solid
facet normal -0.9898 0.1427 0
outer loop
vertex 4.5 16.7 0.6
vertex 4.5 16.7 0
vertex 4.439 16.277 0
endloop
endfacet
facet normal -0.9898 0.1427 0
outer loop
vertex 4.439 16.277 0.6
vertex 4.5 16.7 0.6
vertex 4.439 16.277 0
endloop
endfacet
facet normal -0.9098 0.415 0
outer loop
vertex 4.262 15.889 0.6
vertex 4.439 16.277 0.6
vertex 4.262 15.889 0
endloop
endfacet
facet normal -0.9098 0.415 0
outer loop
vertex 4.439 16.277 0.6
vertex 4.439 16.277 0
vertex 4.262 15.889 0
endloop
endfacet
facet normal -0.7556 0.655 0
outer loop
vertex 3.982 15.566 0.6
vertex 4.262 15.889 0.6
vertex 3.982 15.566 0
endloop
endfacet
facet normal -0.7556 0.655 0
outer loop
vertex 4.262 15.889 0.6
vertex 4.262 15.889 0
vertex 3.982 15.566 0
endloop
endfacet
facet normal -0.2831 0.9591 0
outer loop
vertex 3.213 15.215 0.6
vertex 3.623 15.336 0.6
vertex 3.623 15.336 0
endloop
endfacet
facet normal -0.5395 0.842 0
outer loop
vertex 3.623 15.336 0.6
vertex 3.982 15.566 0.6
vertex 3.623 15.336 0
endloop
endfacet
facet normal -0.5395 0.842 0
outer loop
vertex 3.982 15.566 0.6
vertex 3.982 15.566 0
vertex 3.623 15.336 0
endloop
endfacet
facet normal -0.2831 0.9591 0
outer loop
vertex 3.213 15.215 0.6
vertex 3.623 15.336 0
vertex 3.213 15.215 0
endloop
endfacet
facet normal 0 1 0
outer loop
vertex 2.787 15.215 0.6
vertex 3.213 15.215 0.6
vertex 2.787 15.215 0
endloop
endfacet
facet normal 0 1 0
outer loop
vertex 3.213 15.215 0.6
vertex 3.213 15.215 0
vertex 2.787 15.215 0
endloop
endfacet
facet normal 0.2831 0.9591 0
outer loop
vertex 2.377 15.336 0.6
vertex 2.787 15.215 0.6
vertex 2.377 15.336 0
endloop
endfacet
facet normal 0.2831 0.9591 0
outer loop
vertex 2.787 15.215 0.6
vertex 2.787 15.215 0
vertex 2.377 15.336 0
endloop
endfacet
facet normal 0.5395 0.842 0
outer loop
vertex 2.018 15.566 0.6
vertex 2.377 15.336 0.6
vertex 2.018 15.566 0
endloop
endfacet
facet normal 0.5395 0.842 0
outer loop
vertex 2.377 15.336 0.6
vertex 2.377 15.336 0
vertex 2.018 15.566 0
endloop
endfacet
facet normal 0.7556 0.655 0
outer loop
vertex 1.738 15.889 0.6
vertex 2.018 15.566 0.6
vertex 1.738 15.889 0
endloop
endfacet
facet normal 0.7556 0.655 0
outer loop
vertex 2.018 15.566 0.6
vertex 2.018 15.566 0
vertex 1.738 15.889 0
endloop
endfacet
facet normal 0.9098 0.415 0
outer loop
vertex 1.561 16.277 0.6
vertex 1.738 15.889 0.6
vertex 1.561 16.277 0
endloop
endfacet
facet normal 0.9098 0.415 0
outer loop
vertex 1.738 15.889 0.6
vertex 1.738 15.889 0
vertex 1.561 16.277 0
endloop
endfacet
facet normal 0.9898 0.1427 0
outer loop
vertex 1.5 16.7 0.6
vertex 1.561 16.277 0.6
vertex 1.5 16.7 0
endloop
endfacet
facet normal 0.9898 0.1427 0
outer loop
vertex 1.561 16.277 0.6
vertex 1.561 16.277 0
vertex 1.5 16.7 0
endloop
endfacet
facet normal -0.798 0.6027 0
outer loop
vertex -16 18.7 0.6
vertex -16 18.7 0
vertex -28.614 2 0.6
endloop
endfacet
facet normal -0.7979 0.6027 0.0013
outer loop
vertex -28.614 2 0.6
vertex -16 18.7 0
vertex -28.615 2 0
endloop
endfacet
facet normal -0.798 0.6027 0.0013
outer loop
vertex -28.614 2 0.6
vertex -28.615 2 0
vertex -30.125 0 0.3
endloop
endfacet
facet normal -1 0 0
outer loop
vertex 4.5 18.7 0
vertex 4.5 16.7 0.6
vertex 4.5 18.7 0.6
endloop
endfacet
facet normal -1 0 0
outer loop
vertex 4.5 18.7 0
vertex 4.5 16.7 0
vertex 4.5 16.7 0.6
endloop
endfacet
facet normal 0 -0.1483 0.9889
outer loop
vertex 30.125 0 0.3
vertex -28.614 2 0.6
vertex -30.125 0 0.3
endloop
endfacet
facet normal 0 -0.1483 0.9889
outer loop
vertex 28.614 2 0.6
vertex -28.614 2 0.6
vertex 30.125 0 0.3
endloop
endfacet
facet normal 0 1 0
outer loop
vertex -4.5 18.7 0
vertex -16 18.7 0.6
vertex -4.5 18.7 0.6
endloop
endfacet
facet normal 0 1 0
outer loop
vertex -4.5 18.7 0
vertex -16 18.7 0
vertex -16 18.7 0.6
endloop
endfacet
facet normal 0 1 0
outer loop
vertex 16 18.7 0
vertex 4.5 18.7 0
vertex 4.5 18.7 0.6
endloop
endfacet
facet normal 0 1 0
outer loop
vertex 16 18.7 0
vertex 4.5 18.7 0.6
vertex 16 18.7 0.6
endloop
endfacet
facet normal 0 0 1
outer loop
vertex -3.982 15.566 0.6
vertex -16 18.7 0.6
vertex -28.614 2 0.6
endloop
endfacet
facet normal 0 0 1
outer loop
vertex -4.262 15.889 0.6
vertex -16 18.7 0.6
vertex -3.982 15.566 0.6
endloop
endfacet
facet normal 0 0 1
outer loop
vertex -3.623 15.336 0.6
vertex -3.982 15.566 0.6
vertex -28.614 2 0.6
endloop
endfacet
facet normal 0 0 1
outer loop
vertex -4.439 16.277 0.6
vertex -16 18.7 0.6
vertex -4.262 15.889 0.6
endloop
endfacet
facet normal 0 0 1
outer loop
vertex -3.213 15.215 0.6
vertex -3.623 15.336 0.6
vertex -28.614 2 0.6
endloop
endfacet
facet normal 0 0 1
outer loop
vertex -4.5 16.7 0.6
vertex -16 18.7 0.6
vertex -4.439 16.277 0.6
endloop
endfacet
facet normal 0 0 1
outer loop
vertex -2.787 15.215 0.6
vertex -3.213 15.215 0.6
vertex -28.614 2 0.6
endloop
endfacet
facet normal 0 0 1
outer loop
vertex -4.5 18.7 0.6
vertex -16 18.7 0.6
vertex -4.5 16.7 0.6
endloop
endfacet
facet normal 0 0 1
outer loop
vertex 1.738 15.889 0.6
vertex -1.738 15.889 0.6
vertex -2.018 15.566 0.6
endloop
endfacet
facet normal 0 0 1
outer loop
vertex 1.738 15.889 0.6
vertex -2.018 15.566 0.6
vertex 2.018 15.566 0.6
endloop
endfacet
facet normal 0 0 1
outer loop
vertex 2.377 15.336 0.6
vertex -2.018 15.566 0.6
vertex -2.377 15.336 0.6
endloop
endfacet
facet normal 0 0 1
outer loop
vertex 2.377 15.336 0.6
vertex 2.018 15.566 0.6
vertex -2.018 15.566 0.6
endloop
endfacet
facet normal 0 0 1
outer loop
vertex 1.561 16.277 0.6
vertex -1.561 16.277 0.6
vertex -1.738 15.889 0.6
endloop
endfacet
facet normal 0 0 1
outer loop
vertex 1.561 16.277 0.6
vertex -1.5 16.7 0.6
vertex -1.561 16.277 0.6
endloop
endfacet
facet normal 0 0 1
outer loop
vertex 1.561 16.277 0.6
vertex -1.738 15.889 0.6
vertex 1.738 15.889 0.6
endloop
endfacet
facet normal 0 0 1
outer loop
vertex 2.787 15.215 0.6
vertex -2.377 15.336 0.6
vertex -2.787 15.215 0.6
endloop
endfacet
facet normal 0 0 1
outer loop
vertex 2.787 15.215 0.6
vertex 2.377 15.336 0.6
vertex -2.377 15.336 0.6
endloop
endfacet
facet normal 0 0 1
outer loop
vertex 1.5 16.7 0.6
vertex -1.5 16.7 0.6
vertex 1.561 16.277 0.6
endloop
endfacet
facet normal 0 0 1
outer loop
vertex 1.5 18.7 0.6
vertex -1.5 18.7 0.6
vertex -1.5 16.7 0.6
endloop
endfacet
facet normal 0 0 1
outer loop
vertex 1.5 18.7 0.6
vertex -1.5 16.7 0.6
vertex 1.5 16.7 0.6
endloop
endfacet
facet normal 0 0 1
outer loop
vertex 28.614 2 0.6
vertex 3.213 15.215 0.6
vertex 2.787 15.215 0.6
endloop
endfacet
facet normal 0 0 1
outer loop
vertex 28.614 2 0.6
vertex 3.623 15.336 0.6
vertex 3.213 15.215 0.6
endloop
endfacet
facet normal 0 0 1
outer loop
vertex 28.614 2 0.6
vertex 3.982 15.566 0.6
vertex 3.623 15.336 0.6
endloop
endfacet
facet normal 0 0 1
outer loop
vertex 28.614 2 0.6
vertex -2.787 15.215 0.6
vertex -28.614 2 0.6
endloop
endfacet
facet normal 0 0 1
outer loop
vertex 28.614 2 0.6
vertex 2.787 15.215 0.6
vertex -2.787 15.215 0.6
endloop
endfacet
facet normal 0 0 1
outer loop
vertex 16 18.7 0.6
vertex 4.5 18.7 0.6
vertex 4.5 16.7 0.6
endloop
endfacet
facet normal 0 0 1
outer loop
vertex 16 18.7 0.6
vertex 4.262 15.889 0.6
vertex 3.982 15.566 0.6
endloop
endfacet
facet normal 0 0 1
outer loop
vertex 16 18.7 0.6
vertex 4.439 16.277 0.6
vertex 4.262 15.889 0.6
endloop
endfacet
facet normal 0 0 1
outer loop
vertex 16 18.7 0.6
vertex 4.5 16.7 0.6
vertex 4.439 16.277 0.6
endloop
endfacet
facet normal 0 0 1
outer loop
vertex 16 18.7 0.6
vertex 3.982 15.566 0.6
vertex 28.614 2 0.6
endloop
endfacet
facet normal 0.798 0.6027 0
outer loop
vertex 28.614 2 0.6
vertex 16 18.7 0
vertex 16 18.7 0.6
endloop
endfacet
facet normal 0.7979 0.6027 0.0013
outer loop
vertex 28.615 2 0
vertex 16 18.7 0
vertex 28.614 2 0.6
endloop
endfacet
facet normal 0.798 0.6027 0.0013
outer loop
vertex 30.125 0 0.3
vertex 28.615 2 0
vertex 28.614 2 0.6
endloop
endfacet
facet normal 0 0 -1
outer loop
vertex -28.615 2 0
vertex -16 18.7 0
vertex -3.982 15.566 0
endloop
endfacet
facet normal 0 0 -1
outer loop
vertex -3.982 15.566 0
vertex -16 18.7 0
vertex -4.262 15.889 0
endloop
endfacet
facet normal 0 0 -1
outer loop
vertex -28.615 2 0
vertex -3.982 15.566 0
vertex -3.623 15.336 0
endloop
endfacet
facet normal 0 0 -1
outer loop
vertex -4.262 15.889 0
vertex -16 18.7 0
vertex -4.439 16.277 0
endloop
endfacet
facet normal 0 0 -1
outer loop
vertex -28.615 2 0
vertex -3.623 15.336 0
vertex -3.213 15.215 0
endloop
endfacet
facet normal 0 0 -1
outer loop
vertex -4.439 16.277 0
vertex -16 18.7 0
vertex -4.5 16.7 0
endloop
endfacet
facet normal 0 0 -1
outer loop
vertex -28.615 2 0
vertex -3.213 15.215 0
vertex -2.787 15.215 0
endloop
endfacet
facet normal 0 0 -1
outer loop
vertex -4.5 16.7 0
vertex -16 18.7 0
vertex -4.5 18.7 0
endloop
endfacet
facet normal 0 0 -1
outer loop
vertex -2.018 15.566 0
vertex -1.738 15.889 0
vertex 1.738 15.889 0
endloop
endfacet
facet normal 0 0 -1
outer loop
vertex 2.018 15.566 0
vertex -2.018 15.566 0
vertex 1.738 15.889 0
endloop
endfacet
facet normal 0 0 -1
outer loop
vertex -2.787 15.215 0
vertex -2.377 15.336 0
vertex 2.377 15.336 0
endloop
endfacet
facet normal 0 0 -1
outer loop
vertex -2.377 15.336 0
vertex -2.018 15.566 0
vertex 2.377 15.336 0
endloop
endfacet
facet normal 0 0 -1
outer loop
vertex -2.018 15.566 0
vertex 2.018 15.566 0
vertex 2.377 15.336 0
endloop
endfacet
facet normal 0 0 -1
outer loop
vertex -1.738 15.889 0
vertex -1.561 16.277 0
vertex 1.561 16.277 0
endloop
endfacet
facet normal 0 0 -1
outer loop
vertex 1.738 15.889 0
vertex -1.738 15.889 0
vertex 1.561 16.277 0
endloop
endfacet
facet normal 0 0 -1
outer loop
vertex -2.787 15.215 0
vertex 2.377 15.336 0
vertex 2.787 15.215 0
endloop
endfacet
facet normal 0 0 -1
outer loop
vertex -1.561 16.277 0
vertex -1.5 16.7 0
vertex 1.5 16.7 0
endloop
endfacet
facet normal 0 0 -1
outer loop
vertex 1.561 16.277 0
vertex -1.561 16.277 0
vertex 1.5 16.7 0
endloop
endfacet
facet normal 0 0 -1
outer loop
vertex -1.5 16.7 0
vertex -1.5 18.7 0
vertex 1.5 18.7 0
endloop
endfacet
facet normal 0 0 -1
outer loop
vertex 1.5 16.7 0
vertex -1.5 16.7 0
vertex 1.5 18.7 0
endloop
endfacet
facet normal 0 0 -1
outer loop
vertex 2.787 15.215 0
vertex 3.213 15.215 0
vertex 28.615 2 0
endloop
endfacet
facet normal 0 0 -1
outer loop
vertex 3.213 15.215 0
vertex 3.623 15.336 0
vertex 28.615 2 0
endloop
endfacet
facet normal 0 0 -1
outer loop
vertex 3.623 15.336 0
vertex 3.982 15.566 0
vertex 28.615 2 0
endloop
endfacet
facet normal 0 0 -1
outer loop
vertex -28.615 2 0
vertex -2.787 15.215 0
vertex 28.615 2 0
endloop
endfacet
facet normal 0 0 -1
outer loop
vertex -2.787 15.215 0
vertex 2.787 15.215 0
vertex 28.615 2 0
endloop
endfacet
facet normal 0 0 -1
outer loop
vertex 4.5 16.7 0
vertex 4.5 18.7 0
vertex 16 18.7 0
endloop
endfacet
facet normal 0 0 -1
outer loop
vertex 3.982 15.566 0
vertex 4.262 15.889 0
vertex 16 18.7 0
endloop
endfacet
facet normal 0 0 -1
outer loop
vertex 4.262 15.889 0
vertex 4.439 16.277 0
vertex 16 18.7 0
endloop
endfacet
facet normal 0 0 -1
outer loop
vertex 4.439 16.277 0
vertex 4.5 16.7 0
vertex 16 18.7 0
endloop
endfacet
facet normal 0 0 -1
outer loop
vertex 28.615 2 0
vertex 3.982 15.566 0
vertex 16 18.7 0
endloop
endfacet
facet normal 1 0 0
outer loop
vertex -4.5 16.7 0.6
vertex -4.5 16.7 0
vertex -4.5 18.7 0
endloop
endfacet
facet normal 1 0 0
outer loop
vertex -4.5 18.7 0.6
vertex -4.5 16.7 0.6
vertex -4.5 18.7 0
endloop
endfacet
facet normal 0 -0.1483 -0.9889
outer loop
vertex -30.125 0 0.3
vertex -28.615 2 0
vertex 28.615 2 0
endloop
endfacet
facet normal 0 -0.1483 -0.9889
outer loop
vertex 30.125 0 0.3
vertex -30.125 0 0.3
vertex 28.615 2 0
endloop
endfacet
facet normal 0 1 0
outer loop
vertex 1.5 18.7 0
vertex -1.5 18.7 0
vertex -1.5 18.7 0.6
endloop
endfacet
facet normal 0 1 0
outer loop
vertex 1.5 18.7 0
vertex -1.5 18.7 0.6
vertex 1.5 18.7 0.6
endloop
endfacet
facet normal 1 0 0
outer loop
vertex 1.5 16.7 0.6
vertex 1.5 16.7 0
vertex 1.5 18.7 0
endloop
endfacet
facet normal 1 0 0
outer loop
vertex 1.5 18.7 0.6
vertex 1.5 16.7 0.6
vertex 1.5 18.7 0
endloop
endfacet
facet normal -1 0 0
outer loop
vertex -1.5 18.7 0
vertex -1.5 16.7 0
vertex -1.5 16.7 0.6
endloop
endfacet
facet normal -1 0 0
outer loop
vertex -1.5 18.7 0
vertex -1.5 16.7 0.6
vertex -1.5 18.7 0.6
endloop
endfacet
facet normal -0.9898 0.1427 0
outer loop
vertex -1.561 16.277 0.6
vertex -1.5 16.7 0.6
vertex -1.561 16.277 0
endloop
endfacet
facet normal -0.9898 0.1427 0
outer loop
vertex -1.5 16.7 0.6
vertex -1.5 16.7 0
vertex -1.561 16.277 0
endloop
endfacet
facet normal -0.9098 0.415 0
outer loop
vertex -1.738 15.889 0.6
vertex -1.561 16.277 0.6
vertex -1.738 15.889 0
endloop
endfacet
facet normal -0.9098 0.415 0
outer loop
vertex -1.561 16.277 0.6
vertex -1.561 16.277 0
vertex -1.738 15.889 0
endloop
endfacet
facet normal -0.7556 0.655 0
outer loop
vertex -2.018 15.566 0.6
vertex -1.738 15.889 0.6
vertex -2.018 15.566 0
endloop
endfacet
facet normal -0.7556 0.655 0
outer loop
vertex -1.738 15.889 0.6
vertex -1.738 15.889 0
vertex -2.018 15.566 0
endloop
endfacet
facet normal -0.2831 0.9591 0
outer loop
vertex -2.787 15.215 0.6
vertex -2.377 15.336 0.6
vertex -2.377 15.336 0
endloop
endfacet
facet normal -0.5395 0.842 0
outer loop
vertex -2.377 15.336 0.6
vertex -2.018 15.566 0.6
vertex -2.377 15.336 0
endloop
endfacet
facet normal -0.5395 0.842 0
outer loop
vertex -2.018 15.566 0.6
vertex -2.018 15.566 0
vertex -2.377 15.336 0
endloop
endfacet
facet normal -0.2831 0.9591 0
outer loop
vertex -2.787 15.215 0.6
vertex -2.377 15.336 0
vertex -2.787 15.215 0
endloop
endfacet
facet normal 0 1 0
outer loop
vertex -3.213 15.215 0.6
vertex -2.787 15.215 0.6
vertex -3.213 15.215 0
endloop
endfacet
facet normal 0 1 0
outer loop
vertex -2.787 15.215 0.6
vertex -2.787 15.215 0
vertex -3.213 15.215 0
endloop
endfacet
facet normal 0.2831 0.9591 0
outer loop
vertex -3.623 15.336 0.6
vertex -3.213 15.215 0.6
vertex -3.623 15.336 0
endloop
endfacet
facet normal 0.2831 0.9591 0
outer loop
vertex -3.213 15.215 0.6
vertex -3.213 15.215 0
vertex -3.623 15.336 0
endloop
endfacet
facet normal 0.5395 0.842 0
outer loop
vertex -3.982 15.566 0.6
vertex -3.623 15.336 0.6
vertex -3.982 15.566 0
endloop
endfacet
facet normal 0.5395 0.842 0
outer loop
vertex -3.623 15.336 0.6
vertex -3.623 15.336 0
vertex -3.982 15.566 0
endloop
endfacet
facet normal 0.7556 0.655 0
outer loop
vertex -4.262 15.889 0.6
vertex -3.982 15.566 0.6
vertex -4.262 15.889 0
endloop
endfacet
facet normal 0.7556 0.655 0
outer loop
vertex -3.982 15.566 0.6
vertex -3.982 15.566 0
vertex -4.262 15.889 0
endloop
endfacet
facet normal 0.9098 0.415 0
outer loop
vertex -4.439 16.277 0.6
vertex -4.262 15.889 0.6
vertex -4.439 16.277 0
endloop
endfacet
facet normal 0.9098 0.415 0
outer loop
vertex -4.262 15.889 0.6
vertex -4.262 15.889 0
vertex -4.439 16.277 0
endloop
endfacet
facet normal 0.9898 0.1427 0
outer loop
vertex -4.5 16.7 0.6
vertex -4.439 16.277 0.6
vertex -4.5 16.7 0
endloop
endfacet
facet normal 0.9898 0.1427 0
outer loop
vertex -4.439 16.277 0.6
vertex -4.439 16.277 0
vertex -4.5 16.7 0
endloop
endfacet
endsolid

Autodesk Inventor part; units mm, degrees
ref_plane "YZ Plane" through (0, 0, 0) normal (1, 0, 0) x (0, 1, 0)
ref_plane "XZ Plane" through (0, 0, 0) normal (0, 1, 0) x (-1, 0, 0)
ref_plane "XY Plane" through (0, 0, 0) normal (0, 0, 1) x (1, 0, 0)
sketch "Sketch1" plane through (0, 0, 0) normal (0, 0, 1) x (1, 0, 0)
  line L0 (30.125, 0) -> (-30.125, 0)
  line L1 (-16, 18.7) -> (-16, -21.1524) construction
  line L2 (16, 36.5388) -> (16, -18.8821) construction
  line L3 (-16, 18.7) -> (-30.125, 0)
  line L4 (16, 18.7) -> (30.125, 0)
  arc A0 (-4.5, 16.7) -> (-1.5, 16.7) centre (-3, 16.7) ccw
  line L5 (-4.5, 16.7) -> (-4.5, 18.7)
  line L6 (-1.5, 16.7) -> (-1.5, 18.7)
  line L7 (0, 0.7455) -> (0, 23.152) construction
  arc A1 (1.5, 16.7) -> (4.5, 16.7) centre (3, 16.7) ccw
  line L8 (4.5, 16.7) -> (4.5, 18.7)
  line L9 (1.5, 16.7) -> (1.5, 18.7)
  line L10 (4.5, 18.7) -> (16, 18.7)
  line L11 (16, 18.7) -> (4.5, 18.7)
  line L12 (-16, 18.7) -> (-4.5, 18.7)
  line L13 (-1.5, 18.7) -> (1.5, 18.7)
  line L14 (1.5, 18.7) -> (-1.5, 18.7)
  line L15 (-4.5, 18.7) -> (-16, 18.7)
  point P0 (0, 0)
  point P1 (30.125, 18.7)
  point P2 (-30.125, 18.7)
  dimension "d0" = 0
  dimension "d4" = 16
  dimension "d6" = 3
extrude "Extrusion1" add sketch "Sketch1" along normal blind 0.6
chamfer "Chamfer1" distance 0.3 distance2 2 1 edges at (0, 0, 0.6) measured on face at (-10.0417, 0, 0.2)
chamfer "Chamfer2" distance 0.3 distance2 2 1 edges at (0, 0, 0) measured on face at (10.0417, 0, 0.2)
properties part number "Utility Blade (Stanley)"
